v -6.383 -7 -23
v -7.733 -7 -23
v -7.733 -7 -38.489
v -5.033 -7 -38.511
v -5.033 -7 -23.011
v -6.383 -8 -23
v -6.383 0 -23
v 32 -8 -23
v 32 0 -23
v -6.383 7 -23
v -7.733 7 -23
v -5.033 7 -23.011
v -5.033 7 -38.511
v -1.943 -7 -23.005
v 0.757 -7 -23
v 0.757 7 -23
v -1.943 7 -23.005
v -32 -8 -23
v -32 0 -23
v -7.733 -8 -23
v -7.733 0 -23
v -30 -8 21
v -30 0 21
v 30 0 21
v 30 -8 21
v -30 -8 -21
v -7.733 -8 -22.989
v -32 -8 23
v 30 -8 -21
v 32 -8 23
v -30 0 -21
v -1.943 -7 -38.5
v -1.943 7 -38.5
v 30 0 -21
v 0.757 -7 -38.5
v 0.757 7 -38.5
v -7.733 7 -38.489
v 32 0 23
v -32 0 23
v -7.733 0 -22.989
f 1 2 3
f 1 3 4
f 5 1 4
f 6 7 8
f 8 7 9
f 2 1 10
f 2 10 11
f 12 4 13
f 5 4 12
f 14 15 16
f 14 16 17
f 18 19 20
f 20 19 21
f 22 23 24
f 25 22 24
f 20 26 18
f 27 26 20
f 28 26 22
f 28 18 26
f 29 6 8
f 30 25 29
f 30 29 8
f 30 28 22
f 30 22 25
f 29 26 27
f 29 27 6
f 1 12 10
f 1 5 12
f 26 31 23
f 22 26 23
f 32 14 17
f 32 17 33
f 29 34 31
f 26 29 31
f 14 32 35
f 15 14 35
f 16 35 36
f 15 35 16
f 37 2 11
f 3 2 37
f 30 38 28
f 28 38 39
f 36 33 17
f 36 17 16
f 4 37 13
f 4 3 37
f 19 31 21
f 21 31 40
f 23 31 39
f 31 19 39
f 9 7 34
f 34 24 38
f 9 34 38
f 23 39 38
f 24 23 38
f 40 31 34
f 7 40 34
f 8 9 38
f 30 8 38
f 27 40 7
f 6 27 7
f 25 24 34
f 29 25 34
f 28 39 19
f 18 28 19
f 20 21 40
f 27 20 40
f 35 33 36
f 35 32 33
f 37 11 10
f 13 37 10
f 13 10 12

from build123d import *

# Parameters (mm, degrees)
F1_DEPTH      = 8
F2_DEPTH      = 7
F2_DEPTH_BACK = 7


with BuildPart() as f1:
    # F0 (on Front) → F1 (new body)
    with BuildSketch(Plane.XZ):
        Polygon((30, 21), (30, -21), (0.756938591, -21), (0.756938591, -23), (32, -23), (32, -7.5), (32, 23), (-32, 23), (-32, -7.4891864034), (-32, -23), (-7.7329747899, -23), (-7.7329747899, -22.9891864034), (-7.7329747899, -21), (-30, -21), (-30, 21), align=None)
        Polygon((0.756938591, -23), (0.756938591, -21), (-7.7329747899, -21), (-7.7329747899, -22.9891864034), (-6.3830180995, -23), align=None)
    extrude(amount=F1_DEPTH)


with BuildPart() as f2:
    # F0 (on Front) → F2 (new body, two sides)
    with BuildSketch(Plane.XZ) as f2_sk:
        Polygon((-5.033061409, -23.0108135966), (-6.3830180995, -23), (-7.7329747899, -23), (-7.7329747899, -38.4891864034), (-5.033061409, -38.5108135966), align=None)
    extrude(amount=F2_DEPTH)
    extrude(f2_sk.sketch, amount=-F2_DEPTH_BACK)


with BuildPart() as f2b:
    # F0 (on Front) → F2, piece 2 (new body, two sides)
    with BuildSketch(Plane.XZ) as f2_2_sk:
        Polygon((0.756938591, -38.5), (0.756938591, -23), (-1.943061409, -23.0050426098), (-1.943061409, -38.5), align=None)
    extrude(amount=F2_DEPTH)
    extrude(f2_2_sk.sketch, amount=-F2_DEPTH_BACK)


solid = Compound([f1.part, f2.part, f2b.part])
